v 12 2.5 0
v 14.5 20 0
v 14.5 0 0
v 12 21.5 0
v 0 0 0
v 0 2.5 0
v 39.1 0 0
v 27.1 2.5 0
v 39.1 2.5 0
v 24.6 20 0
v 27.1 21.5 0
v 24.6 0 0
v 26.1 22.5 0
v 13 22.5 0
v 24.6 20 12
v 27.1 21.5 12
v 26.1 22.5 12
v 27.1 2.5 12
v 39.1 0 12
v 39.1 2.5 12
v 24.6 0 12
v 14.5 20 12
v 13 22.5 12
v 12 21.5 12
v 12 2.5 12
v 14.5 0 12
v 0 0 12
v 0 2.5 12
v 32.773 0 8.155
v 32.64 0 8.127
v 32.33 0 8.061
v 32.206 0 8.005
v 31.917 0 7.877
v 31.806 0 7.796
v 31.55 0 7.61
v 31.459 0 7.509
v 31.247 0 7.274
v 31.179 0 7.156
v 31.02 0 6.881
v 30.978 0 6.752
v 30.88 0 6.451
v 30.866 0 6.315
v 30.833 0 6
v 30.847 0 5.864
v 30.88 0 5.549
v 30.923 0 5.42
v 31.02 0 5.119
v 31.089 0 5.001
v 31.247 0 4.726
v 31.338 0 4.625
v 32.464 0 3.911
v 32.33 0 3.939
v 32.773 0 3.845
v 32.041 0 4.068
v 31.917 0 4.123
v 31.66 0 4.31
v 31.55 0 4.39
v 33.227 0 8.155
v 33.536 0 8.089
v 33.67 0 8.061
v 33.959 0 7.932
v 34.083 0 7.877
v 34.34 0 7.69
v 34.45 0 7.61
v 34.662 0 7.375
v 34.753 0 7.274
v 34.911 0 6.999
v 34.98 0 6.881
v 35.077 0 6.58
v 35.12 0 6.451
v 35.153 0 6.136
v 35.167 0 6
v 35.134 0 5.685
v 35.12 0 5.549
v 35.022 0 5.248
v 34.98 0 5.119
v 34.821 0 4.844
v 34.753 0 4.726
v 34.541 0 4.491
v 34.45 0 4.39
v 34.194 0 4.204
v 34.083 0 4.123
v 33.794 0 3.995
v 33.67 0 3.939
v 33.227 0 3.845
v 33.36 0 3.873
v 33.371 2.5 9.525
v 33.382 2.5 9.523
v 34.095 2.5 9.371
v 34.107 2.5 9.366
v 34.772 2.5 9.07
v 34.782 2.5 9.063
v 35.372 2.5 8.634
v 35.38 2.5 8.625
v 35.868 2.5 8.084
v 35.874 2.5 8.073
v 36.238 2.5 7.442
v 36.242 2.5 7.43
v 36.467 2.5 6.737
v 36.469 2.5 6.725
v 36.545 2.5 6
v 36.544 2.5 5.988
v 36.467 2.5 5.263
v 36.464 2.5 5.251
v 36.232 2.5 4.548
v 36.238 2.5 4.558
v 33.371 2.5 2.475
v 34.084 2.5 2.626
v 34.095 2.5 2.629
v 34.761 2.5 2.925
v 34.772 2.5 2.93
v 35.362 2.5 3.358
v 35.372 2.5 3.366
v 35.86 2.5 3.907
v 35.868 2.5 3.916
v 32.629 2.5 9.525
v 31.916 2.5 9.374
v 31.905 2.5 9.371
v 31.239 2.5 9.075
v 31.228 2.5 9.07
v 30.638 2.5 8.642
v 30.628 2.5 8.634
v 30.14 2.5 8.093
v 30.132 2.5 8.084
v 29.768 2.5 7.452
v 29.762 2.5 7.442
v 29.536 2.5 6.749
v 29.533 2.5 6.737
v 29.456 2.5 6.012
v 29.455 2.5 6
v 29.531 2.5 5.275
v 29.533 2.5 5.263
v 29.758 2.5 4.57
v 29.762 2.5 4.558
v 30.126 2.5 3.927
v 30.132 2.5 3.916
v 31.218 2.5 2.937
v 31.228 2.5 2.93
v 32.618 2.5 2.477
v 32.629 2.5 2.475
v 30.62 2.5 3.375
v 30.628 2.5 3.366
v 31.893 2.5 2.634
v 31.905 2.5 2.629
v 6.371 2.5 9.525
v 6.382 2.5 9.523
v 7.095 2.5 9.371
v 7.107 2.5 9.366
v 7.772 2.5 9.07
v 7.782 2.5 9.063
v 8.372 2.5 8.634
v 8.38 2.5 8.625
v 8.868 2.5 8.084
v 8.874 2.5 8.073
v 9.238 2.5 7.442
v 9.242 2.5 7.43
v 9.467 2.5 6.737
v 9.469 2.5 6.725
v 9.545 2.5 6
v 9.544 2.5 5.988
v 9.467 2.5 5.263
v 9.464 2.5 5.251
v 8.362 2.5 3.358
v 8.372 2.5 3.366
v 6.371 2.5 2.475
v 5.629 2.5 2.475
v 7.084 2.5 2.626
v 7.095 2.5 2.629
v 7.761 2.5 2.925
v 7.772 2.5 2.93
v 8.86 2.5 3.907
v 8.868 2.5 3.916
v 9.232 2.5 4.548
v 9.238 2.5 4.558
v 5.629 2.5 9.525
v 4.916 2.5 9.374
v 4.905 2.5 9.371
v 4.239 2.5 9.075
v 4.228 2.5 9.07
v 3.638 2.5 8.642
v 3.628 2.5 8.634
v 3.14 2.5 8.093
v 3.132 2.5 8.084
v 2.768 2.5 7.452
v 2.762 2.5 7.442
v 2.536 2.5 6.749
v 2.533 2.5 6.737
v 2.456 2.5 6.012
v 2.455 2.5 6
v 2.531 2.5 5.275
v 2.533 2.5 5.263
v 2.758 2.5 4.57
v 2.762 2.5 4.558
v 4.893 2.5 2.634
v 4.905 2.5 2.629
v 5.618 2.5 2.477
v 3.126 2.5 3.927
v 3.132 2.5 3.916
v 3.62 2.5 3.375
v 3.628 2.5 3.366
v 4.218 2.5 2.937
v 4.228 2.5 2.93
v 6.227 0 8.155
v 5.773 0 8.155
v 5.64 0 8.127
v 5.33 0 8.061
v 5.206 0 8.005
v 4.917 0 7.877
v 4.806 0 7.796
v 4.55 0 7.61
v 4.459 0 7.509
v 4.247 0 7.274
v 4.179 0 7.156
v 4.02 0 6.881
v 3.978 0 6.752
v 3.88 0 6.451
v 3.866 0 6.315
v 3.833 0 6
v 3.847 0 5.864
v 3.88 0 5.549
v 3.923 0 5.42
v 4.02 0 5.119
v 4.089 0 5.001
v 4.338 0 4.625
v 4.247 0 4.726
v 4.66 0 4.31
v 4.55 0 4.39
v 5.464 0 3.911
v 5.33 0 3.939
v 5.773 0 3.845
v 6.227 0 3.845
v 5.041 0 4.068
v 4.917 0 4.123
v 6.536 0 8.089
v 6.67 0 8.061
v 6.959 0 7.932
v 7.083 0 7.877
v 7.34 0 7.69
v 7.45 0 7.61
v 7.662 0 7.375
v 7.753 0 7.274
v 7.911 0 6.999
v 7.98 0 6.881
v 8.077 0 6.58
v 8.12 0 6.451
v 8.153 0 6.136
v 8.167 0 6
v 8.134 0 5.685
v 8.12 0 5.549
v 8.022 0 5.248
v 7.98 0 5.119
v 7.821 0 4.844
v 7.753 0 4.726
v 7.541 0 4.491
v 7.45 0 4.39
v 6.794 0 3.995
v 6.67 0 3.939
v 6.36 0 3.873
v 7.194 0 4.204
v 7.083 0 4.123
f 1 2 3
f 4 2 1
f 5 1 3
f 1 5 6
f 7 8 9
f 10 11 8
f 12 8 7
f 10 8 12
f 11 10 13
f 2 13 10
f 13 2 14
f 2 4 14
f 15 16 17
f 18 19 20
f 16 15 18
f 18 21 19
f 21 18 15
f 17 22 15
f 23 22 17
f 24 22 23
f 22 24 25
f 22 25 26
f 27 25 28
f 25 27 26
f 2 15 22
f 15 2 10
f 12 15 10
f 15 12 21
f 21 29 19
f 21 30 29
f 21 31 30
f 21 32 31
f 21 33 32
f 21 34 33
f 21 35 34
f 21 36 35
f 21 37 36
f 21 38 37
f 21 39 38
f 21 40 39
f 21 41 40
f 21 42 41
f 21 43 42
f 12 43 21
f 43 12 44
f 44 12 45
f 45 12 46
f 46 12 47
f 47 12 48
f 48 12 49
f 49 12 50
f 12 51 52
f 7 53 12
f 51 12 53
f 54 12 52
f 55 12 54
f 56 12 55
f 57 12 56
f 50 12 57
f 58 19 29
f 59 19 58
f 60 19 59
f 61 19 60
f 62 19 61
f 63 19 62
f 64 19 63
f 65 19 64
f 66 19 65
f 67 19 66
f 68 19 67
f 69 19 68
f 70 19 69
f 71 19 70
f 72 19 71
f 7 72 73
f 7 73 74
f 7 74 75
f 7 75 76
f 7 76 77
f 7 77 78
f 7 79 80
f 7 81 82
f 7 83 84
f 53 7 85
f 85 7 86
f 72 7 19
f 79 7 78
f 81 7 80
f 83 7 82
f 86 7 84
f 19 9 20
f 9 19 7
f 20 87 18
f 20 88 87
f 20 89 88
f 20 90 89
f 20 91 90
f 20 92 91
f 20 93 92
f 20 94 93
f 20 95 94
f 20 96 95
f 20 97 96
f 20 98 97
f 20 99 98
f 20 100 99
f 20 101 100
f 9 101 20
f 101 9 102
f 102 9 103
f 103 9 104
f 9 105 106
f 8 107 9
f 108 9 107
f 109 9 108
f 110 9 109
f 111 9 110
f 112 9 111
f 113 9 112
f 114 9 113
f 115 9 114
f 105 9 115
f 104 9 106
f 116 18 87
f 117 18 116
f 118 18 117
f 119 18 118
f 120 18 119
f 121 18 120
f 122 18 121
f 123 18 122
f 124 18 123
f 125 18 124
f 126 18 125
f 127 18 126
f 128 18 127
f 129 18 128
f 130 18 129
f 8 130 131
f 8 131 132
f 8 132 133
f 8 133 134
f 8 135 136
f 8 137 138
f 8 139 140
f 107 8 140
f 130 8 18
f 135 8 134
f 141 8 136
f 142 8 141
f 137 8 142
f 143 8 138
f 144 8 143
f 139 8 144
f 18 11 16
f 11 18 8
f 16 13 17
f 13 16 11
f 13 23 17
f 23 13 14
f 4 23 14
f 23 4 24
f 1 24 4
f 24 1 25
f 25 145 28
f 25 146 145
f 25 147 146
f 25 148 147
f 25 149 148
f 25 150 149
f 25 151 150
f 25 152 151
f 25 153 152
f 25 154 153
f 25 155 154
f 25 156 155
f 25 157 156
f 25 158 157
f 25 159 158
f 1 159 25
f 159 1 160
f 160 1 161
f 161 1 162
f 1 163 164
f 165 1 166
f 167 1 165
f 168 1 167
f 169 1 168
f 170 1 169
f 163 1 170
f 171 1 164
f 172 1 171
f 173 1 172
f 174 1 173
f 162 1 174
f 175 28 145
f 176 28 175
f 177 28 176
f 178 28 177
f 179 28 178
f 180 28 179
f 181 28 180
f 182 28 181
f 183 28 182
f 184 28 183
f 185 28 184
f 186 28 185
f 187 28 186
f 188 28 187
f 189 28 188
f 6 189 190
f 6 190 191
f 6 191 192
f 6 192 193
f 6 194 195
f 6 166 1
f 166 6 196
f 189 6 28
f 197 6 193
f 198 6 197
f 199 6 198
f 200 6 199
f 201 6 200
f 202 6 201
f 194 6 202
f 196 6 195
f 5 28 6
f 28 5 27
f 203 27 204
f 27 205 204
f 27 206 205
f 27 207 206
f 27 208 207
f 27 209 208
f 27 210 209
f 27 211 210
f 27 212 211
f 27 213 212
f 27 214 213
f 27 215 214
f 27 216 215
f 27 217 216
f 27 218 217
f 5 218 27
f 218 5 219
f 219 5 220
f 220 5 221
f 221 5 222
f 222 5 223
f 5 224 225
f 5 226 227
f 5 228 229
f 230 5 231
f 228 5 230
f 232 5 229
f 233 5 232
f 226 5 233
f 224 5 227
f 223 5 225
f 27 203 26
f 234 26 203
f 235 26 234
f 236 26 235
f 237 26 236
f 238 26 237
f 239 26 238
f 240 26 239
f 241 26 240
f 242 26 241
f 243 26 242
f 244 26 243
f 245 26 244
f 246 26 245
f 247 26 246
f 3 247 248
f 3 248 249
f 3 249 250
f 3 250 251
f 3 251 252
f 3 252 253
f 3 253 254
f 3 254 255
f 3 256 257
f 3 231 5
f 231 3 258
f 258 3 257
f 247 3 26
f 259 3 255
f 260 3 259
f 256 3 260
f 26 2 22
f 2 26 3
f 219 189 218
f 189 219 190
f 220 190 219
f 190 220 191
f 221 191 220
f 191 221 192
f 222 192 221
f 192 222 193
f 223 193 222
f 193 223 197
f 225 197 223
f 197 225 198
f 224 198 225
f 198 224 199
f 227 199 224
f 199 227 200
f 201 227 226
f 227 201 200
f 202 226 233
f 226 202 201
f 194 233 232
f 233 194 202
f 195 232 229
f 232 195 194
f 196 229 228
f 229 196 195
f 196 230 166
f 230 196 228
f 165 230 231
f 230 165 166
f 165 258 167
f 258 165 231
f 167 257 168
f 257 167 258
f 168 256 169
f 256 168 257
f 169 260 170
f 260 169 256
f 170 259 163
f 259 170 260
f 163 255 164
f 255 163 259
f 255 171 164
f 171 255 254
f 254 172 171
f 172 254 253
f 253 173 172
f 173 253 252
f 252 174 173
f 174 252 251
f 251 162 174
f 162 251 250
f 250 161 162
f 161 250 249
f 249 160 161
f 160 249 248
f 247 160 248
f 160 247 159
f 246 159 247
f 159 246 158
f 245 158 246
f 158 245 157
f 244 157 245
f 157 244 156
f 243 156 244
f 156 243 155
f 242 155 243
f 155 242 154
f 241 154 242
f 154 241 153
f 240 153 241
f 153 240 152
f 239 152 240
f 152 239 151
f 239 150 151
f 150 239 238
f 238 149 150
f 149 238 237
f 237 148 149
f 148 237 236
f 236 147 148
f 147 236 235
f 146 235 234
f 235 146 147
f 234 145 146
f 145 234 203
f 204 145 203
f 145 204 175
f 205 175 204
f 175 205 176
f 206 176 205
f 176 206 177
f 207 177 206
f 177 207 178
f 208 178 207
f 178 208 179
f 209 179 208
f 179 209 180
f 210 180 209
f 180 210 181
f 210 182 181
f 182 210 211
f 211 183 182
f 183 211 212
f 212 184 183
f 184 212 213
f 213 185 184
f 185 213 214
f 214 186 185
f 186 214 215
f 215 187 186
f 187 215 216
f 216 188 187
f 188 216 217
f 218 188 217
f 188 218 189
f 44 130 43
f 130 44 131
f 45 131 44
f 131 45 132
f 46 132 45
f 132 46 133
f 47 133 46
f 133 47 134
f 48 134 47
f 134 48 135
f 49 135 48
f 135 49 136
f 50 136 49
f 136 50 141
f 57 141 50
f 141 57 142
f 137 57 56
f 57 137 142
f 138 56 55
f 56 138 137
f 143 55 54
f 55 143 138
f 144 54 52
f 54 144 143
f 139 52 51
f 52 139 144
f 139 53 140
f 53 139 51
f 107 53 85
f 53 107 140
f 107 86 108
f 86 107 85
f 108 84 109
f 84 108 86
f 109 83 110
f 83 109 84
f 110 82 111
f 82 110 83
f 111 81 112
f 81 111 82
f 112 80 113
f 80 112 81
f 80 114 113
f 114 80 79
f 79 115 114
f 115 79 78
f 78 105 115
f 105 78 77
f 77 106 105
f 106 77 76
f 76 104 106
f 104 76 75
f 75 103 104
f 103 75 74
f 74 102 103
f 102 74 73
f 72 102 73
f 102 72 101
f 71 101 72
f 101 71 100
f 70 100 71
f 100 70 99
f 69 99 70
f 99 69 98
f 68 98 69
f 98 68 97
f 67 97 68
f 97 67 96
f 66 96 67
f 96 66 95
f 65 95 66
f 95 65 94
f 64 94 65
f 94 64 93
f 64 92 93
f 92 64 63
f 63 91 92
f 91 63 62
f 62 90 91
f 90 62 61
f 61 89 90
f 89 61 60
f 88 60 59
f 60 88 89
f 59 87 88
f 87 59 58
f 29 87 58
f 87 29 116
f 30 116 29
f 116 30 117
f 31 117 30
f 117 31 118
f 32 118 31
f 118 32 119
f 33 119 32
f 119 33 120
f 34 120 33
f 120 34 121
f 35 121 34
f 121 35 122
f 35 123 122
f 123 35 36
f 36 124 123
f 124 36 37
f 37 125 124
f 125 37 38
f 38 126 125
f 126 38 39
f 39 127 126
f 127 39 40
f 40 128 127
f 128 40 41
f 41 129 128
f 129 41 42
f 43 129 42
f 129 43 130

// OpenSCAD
// file: Parts/Screw.scad
module screw(diameter, length, cutout_sample = false, fs = 0.1, fa = 1) {
    //$fs = 0.1; [size in mm] | $fa = 1; [degrees]
    //$fn = 100; [defined faces]

    module base_model(diameter, length, cone_height, cone_diameter, offset = 0, fs = 0.1, fa = 1) {
        rotate_extrude($fs = fs) {
            polygon([
                    [0, 0],
                    [(diameter + offset) / 2, 0],
                    [(diameter + offset) / 2, (length + offset) - (cone_height + offset)],
                    [(cone_diameter + offset) / 2, length + offset],
                    [0, length + offset],
                ]);
        }
    }

    if (length < diameter) {
        echo("Screw is too short");
        length = diameter + 1;
        echo("New length is: ", length);
    }

    cone_height = diameter * 0.85;
    cone_diameter = diameter * 2;

    if (!cutout_sample) {
        translate([0, 0, - length])
            difference() {
                base_model(diameter, length, cone_height, cone_diameter);

                // top cross part
                translate([0, 0, length + 0.1 - (cone_height - diameter / 2)])
                    difference() {
                        rotate([0, 0, 45])
                            rotate_extrude($fn = 4) {
                                polygon([
                                        [0, 0],
                                        [diameter * 1.4 / 2, 0],
                                        [cone_diameter / 2, cone_height - diameter / 2],
                                        [0, cone_height - diameter / 2],
                                    ]);
                            }
                        for (i = [0 : 1 : 3]) {
                            rotate([0, 0, 90 * i])
                                translate([diameter / 3.18 / 2, diameter / 3.18 / 2, - 0.1])
                                    cube(cone_height + 0.2);
                        }
                    }
            }
    } else {
        offset = 0.2;
        translate([0, 0, - length - offset / 2])
            base_model(diameter, length, cone_height, cone_diameter, offset);
    }
}

function screw_cone_diameter(screw_diameter) = screw_diameter * 2;

screw(3.5, 12);
// main file
use <Parts/Screw.scad>

DEVICE_WIDTH = 10; DEVICE_HEIGHT = 20; // DEFAULT VALUES

//DIGITUS Ultra Slim HDMI Splitter DS-45322 DEVICE_WIDTH = 83.1; DEVICE_HEIGHT = 8.9;
//LOGILINK Digital to Analog Audio Converter CA0101 v2 DEVICE_WIDTH = 53.5; DEVICE_HEIGHT = 21.5;

MATERIAL_THICKNESS = 2.5;
SCREW_DIAMETER = 3.5;

module Bracket(screwSocketWidth, thicknessBracket, deviceWidth, deviceHeight, chamfer = 1) {
    deviceWidth = deviceWidth + 0.1;  // added .1 for tolerance issues
    linear_extrude(height = screwSocketWidth) {
        endWidth = (screwSocketWidth + thicknessBracket) * 2;
        polygon(points = [
                [0, 0],
                [screwSocketWidth + thicknessBracket, 0],
                [screwSocketWidth + thicknessBracket, deviceHeight],
                [screwSocketWidth + thicknessBracket + deviceWidth, deviceHeight],
                [screwSocketWidth + thicknessBracket + deviceWidth, 0],
                [endWidth + deviceWidth, 0],
                [endWidth + deviceWidth, thicknessBracket],
                [screwSocketWidth + thicknessBracket + deviceWidth + thicknessBracket, thicknessBracket],
                [screwSocketWidth + thicknessBracket + deviceWidth + thicknessBracket, deviceHeight + thicknessBracket - chamfer]
            ,
                [screwSocketWidth + thicknessBracket + deviceWidth + thicknessBracket - chamfer, deviceHeight + thicknessBracket]
            ,
                [screwSocketWidth + chamfer, deviceHeight + thicknessBracket],
                [screwSocketWidth, deviceHeight + thicknessBracket - chamfer],
                [screwSocketWidth, thicknessBracket],
                [0, thicknessBracket]
            ]);
    }
}
difference() {
    screwSocketWidth = SCREW_DIAMETER * 2 + 5;
    Bracket(screwSocketWidth, thicknessBracket = MATERIAL_THICKNESS, deviceWidth = DEVICE_WIDTH, deviceHeight = DEVICE_HEIGHT);
    translate([screwSocketWidth / 2, MATERIAL_THICKNESS, screwSocketWidth / 2])
        rotate([- 90, 0, 0]) screw(SCREW_DIAMETER, MATERIAL_THICKNESS * 2, true);
    translate([screwSocketWidth + DEVICE_WIDTH + MATERIAL_THICKNESS * 2, 0, 0])
        translate([screwSocketWidth / 2, MATERIAL_THICKNESS, screwSocketWidth / 2])
            rotate([- 90, 0, 0]) screw(3.5, 5, true);
}
